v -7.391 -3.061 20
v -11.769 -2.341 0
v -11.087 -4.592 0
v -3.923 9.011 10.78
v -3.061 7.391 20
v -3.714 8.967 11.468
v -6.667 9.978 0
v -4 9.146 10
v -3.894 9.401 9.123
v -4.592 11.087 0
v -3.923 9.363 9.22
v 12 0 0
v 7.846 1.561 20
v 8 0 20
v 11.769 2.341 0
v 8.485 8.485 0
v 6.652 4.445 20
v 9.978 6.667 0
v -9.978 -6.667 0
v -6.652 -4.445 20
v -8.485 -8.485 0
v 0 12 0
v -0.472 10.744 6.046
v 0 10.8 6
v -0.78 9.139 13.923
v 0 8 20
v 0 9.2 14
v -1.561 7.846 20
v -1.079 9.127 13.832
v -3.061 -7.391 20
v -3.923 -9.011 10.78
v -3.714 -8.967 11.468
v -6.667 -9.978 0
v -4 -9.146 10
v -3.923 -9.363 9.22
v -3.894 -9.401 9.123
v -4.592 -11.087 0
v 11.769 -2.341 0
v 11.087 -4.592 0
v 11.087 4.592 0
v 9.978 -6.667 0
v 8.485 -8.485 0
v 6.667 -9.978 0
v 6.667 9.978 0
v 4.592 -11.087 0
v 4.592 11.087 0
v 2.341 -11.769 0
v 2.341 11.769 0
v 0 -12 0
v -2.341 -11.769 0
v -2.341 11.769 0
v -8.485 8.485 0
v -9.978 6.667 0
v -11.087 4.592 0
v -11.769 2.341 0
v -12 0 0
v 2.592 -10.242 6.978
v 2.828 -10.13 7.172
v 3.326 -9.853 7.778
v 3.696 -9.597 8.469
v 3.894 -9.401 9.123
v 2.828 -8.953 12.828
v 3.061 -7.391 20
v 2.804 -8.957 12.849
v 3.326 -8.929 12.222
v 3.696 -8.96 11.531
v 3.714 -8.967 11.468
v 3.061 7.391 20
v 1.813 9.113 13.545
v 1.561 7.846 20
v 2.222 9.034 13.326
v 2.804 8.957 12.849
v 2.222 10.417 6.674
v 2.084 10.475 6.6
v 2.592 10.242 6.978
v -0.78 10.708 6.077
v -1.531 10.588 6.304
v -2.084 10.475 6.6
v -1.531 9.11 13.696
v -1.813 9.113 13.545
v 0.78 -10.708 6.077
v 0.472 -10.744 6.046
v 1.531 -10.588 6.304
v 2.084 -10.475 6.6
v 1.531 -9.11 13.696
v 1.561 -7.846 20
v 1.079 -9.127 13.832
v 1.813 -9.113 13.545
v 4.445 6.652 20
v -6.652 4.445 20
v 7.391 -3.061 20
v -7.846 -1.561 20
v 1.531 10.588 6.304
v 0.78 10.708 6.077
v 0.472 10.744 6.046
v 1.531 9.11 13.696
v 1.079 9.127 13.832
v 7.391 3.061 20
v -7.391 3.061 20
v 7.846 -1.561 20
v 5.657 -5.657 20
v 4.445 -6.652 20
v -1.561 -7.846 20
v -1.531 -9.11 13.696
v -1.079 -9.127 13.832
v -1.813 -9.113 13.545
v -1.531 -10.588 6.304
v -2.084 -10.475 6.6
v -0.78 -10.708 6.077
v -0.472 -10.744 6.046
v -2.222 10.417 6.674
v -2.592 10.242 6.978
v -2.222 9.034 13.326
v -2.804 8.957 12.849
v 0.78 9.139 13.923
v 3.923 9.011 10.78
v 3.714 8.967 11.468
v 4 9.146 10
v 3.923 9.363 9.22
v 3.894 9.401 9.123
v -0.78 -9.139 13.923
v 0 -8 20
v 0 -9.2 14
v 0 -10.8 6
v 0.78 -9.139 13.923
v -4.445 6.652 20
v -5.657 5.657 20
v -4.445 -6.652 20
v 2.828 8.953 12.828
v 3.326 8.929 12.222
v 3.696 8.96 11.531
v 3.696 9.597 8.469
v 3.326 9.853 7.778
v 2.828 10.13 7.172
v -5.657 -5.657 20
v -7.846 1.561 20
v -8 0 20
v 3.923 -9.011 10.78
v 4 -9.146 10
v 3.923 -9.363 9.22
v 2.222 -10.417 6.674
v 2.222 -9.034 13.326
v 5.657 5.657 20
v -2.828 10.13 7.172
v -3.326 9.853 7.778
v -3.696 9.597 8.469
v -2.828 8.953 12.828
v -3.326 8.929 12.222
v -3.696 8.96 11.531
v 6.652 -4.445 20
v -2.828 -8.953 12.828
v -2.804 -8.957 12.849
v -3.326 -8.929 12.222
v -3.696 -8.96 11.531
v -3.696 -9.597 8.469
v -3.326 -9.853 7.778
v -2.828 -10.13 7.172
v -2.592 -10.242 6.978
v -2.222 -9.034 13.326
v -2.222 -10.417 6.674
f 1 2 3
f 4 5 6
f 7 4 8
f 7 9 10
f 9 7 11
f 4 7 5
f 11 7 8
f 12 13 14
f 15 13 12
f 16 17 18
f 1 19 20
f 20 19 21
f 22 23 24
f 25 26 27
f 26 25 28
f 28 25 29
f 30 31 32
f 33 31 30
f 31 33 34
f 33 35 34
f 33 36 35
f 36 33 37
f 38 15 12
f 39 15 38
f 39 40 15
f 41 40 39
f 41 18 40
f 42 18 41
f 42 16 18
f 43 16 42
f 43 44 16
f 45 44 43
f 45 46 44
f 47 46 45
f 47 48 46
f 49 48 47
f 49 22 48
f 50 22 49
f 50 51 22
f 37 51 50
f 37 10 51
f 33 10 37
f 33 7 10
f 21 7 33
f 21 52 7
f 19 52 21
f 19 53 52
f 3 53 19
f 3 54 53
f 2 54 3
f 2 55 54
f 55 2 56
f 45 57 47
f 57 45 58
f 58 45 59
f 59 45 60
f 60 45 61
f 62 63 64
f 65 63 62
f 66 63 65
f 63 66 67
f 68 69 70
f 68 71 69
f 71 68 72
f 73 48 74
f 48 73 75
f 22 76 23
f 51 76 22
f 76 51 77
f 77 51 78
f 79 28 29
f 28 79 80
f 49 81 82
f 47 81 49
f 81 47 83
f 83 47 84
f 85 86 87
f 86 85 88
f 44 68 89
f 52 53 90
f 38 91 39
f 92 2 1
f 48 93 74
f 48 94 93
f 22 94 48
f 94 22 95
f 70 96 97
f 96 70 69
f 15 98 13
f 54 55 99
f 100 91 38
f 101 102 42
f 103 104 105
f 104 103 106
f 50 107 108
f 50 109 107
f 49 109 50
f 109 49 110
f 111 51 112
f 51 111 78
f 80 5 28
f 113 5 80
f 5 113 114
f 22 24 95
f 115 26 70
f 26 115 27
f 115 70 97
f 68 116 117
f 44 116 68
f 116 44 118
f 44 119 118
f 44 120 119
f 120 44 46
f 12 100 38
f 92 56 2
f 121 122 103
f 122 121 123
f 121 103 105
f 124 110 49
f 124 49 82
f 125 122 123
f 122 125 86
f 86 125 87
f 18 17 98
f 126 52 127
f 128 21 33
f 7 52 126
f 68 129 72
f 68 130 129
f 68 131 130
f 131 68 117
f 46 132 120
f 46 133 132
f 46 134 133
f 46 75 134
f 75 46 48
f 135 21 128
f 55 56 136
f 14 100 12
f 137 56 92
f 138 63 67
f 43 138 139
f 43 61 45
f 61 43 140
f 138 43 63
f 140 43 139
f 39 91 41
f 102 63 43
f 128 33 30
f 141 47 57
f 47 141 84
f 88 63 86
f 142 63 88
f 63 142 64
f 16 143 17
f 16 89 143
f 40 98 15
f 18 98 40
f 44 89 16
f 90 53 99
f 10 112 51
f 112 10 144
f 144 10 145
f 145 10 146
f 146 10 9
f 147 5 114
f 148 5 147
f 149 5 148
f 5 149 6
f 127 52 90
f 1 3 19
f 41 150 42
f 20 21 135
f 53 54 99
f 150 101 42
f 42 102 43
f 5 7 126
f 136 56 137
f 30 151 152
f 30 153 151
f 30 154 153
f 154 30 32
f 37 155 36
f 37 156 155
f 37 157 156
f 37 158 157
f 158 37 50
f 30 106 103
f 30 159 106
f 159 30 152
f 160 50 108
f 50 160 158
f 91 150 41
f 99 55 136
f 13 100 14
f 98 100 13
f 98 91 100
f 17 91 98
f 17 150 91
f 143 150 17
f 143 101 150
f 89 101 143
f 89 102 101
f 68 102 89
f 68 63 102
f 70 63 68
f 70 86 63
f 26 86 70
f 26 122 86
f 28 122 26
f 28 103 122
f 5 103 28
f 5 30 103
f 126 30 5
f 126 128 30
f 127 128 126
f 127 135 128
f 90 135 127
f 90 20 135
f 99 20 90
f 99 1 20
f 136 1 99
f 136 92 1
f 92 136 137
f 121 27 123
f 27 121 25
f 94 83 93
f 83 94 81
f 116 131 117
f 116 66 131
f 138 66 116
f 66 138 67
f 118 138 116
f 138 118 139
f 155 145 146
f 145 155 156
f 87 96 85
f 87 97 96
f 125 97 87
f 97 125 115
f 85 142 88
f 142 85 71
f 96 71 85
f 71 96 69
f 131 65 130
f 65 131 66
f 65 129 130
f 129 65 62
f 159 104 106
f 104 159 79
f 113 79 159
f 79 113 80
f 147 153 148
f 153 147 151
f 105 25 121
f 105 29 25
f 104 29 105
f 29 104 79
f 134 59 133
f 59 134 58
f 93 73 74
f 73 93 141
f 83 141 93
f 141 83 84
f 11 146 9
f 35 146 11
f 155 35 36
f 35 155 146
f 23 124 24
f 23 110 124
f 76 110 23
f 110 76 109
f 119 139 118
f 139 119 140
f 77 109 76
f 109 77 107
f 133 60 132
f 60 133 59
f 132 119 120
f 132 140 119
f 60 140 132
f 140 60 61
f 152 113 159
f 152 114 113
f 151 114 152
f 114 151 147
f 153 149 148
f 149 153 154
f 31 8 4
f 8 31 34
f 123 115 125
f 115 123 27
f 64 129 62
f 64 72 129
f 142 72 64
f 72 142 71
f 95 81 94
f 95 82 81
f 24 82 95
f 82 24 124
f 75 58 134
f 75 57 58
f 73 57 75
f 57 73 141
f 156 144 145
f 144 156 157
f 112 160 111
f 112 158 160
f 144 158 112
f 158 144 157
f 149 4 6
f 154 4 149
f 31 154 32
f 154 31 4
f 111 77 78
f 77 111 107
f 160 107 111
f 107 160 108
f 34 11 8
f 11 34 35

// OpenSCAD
// A cone bored across, so the bore's own trim runs on a tapered wall.
//
// step-bored-cylinder is the same shape on a cylinder. This one is here because
// the surface the bore is cut into is a *cone*, which changes what has to be
// written on both sides: the wall's rims are still circles so the band pass can
// take the arc-bounded parts of it as conical faces, but the bore's ends are
// where it meets a taper, and neither is a plane section of anything.
//
// The exact pass takes twenty facets - the two arcs of the wall the bore did not
// interrupt - and leaves fifty-four planes.
// Four records: a circle at each rim of the frustum, the cone between them, and
// the bore's own cylinder. The cone is declared rather than left to be
// recognised from its two rims - see doc/step-export-development.md, *The rule:
// declare first, recognise second*.
// EXPECT: 4 analytic surfaces available (3 cylindrical, 0 spherical, 0 toroidal, 0 Bezier, 1 conical)
// EXPECT: 2 surfaces recognised (0 toroidal, 0 spherical, 2 conical, 2 partial), 20 facets replaced
//
// The exact tier now writes the bore as well, and for the same reason as in
// step-bored-cylinder: the taper is the faceted one here, so each of its facets
// is a flat plane, and a plane cuts the bore *cylinder* in an ellipse. The mesh
// edges where the bore meets a taper facet are chords of that ellipse; the
// ellipse replaces them and the taper facet across it is handed the same edge.
// EXPECT: 10 trimmed quadrics written as one face each, replacing 24 facets
// EXPECT: 20 plane sections written as the conic it is
//
// The census moves by arithmetic: each replaced facet was one PLANE, so
// 54 - 24 = 30 remain, and the ten new faces are all the bore, so they are
// cylinders and the two conical band faces are untouched.
// ROUNDTRIP: Cone=2 Cylinder=10 Plane=30
// EDGES: Ellipse=20
//
// With the approximation flag the trimmed-quadric path takes the bore - a
// cylinder whose two rims are the curve where it meets the taper, the case the
// band model cannot express at all - and the four quadrants of wall around the
// two mouths, which are cone and could not be band-written because a mouth is
// not a plane section. Five faces: the bore, and one per mouth quadrant. The
// bore goes all the way round between its two mouths, and since 2026-09-25 it
// is one face closed by a seam along a ruling of the cylinder, as a band is -
// until then it was cut in two, an edge the model does not have (checklist D1).
//
// Five and not one is the whole of what declaring the cone bought here. Before
// it, the wall's four quadrants had no declared cone to be measured against -
// only the two rim circles, and a rim is what the bore takes away - so they
// stayed as fifty-four planes.
// APPROX: 5 trimmed quadrics written as one face each, replacing 52 facets
// APPROX: 1 face round its axis between two rims closed by a seam along a ruling
// APPROX: approximation found nothing left to fit
// ROUNDTRIP-APPROX: Cone=6 Cylinder=1 Plane=2
//
// In the approximation tier the opening is neither chords nor plane sections: it
// is the curve itself. A cone and a cylinder crossing meet in a quartic, which
// ISO 10303 has no entity for, so it is written as a B-spline fitted to the true
// curve found from the two *declarations* - held to 1e-7, and read identically by
// both faces because it is decided once for the edges it covers.
//
// One curve per run of edges, from where a third edge meets it to the next -
// until 2026-09-25 one per mesh edge, eighty pieces. As on step-bored-cylinder:
// each mouth borders the bore and two of the cone's faces, two runs a mouth,
// and the seam closing the bore ends on each mouth and cuts one run there. Six.
// APPROX: 6 edges written as the curve where two declared surfaces cross
// APPROX: those 6 curves cover 80 edges of the mesh
// APPROX: 6 of those carry a pcurve on each of the two surfaces
// EDGES-APPROX: BSplineCurve=6
//
// Eighty ties two report lines together: the provenance pass finds exactly 80
// junction vertices owned by two surfaces, the bore opens on the taper in two
// closed loops, and a closed loop through n vertices has n edges.
//
// Cone=6 is also the assertion that guards the membership test. A facet that
// spans a hole in a surface has every corner on that surface and no interior on
// it: the bore is walled by one quad per angular step running its whole length,
// and all four corners of each sit on the mouth curves, which are sections of
// the cone. Claiming those for the cone gives Cone=12 Cylinder=4 - a census
// that looks *better* - on a solid whose interior is wrong by half. See
// recogniseQuadricPatches, where the interior of a facet is sampled and not
// only its corners.
//
// The volume is derived. The frustum is (pi*20/3)(12^2 + 12*8 + 8^2) =
// 6366.961111. The bore through it is not elementary - the wall it crosses is
// tapered, so its half width follows R(z) = 12 - 0.2z - and integrating
// 2*sqrt(R(z)^2 - x^2) over the bore's disc gives 984.757269, leaving
// 5382.203842.
//
// And there is nothing left for a window to cover. Every face is the exact
// quadric and the bore's mouth is the quartic, so the export reads 5382.205081
// against the derived 5382.203842 - over by 0.00124, where it used to be over by
// 3.2 with the mouth bounded by chords. That is 2.3e-07 relative, inside the
// default 1e-6 the harness applies when no window is given, so the +/- 12.0 goes
// and the assertion becomes four times stricter than the thing it is measuring.
// VOLUME-APPROX: 5382.203842
//
// Open item 33 - on the CGAL backend, a planar face written with a bound off
// its plane - was carried here as a KNOWN-EXPORT-ERROR from 2026-09-24 until
// 2026-09-30, when the triangle merge began asking exact coplanarity: merging
// within 1e-8 of the model's size had put triangles whose corners were not on
// one plane into one planar face.
//
// Every facet its maker named for a declared surface is D0 by that heritage,
// whole or cut, and has to end in a face written on that surface (checklist
// B6, B7, E8). A facet a boolean cut is not in its surface's D0 region yet -
// the region holds whole facets only - so nothing proposes it at the exact
// tier, and at the approximation tier a statistic over the tessellation
// refuses it (C3). Measured 2026-09-29:
//   exact tier, 28 facets (28 cut): 20 on cone 4 (claimed by nothing for it); 8 on cylinder 5
//     (claimed by nothing for it)
// Tolerated by name until cut facets join their region and no statistic
// vetoes a named facet (doc/step-export-wip.md, open item 34); the test
// fails the day it is no longer raised.
// KNOWN-EXPORT-ERROR: facets named by their maker for a declared surface are not written on it
$fn = 32;
difference() {
	cylinder(r1 = 12, r2 = 8, h = 20);
	translate([0, 0, 10]) rotate([90, 0, 0]) cylinder(r = 4, h = 60, center = true);
}
